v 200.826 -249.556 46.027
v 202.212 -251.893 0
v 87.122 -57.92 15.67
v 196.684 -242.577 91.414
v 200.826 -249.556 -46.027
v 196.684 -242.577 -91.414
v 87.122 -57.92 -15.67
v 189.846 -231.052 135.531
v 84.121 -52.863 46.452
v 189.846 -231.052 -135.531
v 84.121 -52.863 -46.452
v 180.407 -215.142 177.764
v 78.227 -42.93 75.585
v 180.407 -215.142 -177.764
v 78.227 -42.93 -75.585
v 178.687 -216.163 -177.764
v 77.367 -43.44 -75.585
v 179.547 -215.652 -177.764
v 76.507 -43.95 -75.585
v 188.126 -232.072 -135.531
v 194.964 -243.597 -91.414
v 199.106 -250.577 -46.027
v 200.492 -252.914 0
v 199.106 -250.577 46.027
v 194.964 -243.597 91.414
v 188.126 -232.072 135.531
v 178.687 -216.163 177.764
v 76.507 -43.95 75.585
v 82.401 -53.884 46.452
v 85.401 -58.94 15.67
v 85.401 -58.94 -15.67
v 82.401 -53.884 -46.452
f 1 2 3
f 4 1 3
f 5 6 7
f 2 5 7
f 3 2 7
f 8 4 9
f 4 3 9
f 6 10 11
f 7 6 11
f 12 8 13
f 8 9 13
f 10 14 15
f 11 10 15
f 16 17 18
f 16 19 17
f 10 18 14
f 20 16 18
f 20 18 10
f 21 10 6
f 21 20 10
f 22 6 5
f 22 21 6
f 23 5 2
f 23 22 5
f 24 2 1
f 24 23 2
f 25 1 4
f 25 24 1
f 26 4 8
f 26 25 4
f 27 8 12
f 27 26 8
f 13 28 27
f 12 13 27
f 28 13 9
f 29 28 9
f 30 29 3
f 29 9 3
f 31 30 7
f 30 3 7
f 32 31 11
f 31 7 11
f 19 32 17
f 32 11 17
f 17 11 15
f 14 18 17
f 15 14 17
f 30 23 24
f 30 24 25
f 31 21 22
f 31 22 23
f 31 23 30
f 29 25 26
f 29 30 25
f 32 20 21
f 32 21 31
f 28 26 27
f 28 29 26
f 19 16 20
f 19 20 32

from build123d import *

# Parameters (mm, degrees)
THICKEN1_T1 = 1
THICKEN1_T2 = 1


with BuildPart() as body_1:
    # Sketch2 → Surface-Plane1: a flat surface bounded by the sketch
    with BuildSketch(Plane(origin=(18.304702573, 56.103893903, 84.504712269), x_dir=(-0.3617763934446254, 0.6097357967348626, 0.7052234392916206), z_dir=(-0.8600121206459034, -0.5102736053747404, -1.0969032612691395e-15)), mode=Mode.PRIVATE) as surface_plane1_1_region:
        with BuildLine():
            Line((-158.264155059, -288.964285994), (-88.353199476, -75.303587479))
            ThreePointArc((-88.353199476, -75.303587479), (-154.539912555, -34.528871866), (-194.96195103, 31.873818041))
            Line((-194.96195103, 31.873818041), (-408.99153859, -36.899515812))
            ThreePointArc((-408.99153859, -36.899515812), (-313.925122407, -193.068427437), (-158.264155059, -288.964285994))
        make_face()
    surface_plane1_1 = surface_plane1_1_region.sketch.faces()[0]
    add(Solid.thicken(surface_plane1_1, THICKEN1_T1))
    add(Solid.thicken(surface_plane1_1, -THICKEN1_T2))


solid = body_1.part
